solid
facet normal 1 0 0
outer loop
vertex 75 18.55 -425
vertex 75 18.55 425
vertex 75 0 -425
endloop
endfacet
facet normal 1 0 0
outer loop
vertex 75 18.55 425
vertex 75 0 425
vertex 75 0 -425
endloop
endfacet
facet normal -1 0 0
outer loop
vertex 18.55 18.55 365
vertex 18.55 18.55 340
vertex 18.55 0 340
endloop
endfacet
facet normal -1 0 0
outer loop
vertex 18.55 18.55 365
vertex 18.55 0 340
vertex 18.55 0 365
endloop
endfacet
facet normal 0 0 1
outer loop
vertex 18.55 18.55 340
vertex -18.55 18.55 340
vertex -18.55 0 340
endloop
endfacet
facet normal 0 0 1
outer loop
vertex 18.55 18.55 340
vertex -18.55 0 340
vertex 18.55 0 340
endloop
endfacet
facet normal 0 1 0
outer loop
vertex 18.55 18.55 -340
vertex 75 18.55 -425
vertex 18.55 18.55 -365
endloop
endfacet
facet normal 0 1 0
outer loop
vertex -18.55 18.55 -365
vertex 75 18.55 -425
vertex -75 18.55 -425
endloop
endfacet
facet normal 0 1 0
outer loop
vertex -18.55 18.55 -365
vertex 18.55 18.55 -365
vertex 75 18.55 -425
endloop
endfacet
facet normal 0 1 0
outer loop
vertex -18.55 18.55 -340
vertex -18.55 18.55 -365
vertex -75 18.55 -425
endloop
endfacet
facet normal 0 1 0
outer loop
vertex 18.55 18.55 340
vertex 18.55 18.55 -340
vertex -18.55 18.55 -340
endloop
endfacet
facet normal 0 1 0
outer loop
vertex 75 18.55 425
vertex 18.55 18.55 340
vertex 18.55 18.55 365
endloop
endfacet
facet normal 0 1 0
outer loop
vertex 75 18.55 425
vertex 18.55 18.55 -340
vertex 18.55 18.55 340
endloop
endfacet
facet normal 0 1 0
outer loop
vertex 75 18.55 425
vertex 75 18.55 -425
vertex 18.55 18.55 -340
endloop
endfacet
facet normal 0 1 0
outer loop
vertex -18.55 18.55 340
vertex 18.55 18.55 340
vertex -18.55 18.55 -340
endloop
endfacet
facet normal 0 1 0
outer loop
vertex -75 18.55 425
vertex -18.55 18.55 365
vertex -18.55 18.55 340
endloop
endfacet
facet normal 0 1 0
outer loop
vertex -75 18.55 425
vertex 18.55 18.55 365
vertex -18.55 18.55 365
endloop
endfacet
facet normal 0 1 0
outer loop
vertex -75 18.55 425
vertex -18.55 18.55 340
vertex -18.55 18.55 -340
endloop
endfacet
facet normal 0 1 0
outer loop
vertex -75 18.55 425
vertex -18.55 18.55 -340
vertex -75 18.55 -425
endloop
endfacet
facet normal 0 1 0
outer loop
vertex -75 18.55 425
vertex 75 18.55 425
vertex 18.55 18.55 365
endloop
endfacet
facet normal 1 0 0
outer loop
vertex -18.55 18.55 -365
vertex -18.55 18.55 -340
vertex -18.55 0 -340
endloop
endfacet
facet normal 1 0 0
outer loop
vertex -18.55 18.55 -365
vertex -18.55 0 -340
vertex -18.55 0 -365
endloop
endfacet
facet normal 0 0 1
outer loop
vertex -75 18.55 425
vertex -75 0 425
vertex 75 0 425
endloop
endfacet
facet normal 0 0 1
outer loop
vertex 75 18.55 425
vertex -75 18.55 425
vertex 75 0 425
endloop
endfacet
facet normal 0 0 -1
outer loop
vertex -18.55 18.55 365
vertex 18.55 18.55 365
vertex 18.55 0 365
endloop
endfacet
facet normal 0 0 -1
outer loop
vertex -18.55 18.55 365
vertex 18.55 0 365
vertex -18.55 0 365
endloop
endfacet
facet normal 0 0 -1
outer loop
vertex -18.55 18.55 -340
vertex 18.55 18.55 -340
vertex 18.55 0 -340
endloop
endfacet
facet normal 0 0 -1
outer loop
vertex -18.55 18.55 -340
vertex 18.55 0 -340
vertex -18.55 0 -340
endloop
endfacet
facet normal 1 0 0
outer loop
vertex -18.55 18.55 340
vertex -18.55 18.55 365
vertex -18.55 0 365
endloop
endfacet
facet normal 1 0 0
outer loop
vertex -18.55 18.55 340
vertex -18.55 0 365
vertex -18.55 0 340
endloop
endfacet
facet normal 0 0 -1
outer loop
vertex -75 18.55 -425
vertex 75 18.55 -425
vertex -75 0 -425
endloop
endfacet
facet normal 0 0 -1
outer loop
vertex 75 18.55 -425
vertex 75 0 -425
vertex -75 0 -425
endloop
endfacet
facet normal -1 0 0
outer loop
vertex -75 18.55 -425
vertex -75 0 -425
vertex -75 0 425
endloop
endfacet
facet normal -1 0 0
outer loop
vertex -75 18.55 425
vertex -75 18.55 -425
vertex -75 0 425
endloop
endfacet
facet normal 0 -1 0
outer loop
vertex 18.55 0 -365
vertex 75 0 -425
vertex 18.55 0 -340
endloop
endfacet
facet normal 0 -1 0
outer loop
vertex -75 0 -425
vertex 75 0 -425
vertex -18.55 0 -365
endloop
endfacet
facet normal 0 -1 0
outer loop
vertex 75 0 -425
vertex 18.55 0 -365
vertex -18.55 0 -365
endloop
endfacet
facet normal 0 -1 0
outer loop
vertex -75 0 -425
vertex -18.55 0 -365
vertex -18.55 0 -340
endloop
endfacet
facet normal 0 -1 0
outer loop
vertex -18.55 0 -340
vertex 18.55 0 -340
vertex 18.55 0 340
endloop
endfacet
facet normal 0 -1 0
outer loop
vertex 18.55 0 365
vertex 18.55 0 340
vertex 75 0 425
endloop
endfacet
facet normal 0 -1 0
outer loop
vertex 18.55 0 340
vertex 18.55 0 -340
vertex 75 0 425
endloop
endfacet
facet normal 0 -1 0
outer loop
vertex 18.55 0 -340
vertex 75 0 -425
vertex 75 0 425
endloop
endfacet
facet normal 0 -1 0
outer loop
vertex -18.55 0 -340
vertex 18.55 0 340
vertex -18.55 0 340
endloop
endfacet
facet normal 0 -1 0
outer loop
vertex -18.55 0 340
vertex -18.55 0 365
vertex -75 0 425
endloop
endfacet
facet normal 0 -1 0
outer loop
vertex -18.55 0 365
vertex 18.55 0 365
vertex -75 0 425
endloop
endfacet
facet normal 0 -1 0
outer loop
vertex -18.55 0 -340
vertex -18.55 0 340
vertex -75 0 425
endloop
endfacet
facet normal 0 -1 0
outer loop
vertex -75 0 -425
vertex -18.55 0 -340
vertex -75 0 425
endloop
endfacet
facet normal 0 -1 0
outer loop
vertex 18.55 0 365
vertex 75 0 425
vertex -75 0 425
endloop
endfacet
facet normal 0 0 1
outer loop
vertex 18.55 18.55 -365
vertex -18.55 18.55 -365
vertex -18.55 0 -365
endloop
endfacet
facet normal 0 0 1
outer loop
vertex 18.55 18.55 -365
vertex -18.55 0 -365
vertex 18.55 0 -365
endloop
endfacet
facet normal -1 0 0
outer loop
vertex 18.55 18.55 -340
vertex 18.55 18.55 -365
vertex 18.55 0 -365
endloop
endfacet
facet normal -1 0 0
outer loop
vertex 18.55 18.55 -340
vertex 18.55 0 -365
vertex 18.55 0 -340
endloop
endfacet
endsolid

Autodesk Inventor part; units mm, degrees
ref_plane "YZ Plane" through (0, 0, 0) normal (1, 0, 0) x (0, 1, 0)
ref_plane "XZ Plane" through (0, 0, 0) normal (0, 1, 0) x (-1, 0, 0)
ref_plane "XY Plane" through (0, 0, 0) normal (0, 0, 1) x (1, 0, 0)
sketch "Sketch1" plane through (0, 0, 0) normal (0, 1, 0) x (-1, 0, 0)
  line L0 (-75, -425) -> (75, -425)
  line L1 (75, -425) -> (75, 425)
  line L2 (75, 425) -> (-75, 425)
  line L3 (-75, 425) -> (-75, -425)
  line L4 (-75, -425) -> (75, 425) construction
  line L5 (75, -425) -> (-75, 425) construction
  point P0 (0, 0)
  dimension "d0" = 850
  dimension "d1" = 150
extrude "Extrusion1" add sketch "Sketch1" along normal blind 18.55
sketch "Sketch2" plane through (0, 18.55, 0) normal (0, 1, 0) x (1, 0, 0)
  line L0 (18.55, -365) -> (-18.55, -365)
  line L1 (-18.55, -365) -> (-18.55, -340)
  line L2 (-18.55, -340) -> (18.55, -340)
  line L3 (18.55, -340) -> (18.55, -365)
  line L4 (18.55, -365) -> (-18.55, -340) construction
  line L5 (-18.55, -365) -> (18.55, -340) construction
  line L6 (18.55, 340) -> (-18.55, 340)
  line L7 (-18.55, 340) -> (-18.55, 365)
  line L8 (-18.55, 365) -> (18.55, 365)
  line L9 (18.55, 365) -> (18.55, 340)
  line L10 (18.55, 340) -> (-18.55, 365) construction
  line L11 (-18.55, 340) -> (18.55, 365) construction
  line L12 (0, -365) -> (0, -425) construction
  line L13 (-75, -425) -> (75, -425) projected
  line L14 (0, 365) -> (0, 425) construction
  line L15 (75, 425) -> (-75, 425) projected
  point P0 (0, 0)
  point P1 (0, -352.5)
  point P2 (0, 352.5)
  dimension "d4" = 730
  dimension "d5" = 25
  dimension "d6" = 37.1
extrude "Extrusion2" cut sketch "Sketch2" against normal blind 18.55
properties part number "floor_Part"
